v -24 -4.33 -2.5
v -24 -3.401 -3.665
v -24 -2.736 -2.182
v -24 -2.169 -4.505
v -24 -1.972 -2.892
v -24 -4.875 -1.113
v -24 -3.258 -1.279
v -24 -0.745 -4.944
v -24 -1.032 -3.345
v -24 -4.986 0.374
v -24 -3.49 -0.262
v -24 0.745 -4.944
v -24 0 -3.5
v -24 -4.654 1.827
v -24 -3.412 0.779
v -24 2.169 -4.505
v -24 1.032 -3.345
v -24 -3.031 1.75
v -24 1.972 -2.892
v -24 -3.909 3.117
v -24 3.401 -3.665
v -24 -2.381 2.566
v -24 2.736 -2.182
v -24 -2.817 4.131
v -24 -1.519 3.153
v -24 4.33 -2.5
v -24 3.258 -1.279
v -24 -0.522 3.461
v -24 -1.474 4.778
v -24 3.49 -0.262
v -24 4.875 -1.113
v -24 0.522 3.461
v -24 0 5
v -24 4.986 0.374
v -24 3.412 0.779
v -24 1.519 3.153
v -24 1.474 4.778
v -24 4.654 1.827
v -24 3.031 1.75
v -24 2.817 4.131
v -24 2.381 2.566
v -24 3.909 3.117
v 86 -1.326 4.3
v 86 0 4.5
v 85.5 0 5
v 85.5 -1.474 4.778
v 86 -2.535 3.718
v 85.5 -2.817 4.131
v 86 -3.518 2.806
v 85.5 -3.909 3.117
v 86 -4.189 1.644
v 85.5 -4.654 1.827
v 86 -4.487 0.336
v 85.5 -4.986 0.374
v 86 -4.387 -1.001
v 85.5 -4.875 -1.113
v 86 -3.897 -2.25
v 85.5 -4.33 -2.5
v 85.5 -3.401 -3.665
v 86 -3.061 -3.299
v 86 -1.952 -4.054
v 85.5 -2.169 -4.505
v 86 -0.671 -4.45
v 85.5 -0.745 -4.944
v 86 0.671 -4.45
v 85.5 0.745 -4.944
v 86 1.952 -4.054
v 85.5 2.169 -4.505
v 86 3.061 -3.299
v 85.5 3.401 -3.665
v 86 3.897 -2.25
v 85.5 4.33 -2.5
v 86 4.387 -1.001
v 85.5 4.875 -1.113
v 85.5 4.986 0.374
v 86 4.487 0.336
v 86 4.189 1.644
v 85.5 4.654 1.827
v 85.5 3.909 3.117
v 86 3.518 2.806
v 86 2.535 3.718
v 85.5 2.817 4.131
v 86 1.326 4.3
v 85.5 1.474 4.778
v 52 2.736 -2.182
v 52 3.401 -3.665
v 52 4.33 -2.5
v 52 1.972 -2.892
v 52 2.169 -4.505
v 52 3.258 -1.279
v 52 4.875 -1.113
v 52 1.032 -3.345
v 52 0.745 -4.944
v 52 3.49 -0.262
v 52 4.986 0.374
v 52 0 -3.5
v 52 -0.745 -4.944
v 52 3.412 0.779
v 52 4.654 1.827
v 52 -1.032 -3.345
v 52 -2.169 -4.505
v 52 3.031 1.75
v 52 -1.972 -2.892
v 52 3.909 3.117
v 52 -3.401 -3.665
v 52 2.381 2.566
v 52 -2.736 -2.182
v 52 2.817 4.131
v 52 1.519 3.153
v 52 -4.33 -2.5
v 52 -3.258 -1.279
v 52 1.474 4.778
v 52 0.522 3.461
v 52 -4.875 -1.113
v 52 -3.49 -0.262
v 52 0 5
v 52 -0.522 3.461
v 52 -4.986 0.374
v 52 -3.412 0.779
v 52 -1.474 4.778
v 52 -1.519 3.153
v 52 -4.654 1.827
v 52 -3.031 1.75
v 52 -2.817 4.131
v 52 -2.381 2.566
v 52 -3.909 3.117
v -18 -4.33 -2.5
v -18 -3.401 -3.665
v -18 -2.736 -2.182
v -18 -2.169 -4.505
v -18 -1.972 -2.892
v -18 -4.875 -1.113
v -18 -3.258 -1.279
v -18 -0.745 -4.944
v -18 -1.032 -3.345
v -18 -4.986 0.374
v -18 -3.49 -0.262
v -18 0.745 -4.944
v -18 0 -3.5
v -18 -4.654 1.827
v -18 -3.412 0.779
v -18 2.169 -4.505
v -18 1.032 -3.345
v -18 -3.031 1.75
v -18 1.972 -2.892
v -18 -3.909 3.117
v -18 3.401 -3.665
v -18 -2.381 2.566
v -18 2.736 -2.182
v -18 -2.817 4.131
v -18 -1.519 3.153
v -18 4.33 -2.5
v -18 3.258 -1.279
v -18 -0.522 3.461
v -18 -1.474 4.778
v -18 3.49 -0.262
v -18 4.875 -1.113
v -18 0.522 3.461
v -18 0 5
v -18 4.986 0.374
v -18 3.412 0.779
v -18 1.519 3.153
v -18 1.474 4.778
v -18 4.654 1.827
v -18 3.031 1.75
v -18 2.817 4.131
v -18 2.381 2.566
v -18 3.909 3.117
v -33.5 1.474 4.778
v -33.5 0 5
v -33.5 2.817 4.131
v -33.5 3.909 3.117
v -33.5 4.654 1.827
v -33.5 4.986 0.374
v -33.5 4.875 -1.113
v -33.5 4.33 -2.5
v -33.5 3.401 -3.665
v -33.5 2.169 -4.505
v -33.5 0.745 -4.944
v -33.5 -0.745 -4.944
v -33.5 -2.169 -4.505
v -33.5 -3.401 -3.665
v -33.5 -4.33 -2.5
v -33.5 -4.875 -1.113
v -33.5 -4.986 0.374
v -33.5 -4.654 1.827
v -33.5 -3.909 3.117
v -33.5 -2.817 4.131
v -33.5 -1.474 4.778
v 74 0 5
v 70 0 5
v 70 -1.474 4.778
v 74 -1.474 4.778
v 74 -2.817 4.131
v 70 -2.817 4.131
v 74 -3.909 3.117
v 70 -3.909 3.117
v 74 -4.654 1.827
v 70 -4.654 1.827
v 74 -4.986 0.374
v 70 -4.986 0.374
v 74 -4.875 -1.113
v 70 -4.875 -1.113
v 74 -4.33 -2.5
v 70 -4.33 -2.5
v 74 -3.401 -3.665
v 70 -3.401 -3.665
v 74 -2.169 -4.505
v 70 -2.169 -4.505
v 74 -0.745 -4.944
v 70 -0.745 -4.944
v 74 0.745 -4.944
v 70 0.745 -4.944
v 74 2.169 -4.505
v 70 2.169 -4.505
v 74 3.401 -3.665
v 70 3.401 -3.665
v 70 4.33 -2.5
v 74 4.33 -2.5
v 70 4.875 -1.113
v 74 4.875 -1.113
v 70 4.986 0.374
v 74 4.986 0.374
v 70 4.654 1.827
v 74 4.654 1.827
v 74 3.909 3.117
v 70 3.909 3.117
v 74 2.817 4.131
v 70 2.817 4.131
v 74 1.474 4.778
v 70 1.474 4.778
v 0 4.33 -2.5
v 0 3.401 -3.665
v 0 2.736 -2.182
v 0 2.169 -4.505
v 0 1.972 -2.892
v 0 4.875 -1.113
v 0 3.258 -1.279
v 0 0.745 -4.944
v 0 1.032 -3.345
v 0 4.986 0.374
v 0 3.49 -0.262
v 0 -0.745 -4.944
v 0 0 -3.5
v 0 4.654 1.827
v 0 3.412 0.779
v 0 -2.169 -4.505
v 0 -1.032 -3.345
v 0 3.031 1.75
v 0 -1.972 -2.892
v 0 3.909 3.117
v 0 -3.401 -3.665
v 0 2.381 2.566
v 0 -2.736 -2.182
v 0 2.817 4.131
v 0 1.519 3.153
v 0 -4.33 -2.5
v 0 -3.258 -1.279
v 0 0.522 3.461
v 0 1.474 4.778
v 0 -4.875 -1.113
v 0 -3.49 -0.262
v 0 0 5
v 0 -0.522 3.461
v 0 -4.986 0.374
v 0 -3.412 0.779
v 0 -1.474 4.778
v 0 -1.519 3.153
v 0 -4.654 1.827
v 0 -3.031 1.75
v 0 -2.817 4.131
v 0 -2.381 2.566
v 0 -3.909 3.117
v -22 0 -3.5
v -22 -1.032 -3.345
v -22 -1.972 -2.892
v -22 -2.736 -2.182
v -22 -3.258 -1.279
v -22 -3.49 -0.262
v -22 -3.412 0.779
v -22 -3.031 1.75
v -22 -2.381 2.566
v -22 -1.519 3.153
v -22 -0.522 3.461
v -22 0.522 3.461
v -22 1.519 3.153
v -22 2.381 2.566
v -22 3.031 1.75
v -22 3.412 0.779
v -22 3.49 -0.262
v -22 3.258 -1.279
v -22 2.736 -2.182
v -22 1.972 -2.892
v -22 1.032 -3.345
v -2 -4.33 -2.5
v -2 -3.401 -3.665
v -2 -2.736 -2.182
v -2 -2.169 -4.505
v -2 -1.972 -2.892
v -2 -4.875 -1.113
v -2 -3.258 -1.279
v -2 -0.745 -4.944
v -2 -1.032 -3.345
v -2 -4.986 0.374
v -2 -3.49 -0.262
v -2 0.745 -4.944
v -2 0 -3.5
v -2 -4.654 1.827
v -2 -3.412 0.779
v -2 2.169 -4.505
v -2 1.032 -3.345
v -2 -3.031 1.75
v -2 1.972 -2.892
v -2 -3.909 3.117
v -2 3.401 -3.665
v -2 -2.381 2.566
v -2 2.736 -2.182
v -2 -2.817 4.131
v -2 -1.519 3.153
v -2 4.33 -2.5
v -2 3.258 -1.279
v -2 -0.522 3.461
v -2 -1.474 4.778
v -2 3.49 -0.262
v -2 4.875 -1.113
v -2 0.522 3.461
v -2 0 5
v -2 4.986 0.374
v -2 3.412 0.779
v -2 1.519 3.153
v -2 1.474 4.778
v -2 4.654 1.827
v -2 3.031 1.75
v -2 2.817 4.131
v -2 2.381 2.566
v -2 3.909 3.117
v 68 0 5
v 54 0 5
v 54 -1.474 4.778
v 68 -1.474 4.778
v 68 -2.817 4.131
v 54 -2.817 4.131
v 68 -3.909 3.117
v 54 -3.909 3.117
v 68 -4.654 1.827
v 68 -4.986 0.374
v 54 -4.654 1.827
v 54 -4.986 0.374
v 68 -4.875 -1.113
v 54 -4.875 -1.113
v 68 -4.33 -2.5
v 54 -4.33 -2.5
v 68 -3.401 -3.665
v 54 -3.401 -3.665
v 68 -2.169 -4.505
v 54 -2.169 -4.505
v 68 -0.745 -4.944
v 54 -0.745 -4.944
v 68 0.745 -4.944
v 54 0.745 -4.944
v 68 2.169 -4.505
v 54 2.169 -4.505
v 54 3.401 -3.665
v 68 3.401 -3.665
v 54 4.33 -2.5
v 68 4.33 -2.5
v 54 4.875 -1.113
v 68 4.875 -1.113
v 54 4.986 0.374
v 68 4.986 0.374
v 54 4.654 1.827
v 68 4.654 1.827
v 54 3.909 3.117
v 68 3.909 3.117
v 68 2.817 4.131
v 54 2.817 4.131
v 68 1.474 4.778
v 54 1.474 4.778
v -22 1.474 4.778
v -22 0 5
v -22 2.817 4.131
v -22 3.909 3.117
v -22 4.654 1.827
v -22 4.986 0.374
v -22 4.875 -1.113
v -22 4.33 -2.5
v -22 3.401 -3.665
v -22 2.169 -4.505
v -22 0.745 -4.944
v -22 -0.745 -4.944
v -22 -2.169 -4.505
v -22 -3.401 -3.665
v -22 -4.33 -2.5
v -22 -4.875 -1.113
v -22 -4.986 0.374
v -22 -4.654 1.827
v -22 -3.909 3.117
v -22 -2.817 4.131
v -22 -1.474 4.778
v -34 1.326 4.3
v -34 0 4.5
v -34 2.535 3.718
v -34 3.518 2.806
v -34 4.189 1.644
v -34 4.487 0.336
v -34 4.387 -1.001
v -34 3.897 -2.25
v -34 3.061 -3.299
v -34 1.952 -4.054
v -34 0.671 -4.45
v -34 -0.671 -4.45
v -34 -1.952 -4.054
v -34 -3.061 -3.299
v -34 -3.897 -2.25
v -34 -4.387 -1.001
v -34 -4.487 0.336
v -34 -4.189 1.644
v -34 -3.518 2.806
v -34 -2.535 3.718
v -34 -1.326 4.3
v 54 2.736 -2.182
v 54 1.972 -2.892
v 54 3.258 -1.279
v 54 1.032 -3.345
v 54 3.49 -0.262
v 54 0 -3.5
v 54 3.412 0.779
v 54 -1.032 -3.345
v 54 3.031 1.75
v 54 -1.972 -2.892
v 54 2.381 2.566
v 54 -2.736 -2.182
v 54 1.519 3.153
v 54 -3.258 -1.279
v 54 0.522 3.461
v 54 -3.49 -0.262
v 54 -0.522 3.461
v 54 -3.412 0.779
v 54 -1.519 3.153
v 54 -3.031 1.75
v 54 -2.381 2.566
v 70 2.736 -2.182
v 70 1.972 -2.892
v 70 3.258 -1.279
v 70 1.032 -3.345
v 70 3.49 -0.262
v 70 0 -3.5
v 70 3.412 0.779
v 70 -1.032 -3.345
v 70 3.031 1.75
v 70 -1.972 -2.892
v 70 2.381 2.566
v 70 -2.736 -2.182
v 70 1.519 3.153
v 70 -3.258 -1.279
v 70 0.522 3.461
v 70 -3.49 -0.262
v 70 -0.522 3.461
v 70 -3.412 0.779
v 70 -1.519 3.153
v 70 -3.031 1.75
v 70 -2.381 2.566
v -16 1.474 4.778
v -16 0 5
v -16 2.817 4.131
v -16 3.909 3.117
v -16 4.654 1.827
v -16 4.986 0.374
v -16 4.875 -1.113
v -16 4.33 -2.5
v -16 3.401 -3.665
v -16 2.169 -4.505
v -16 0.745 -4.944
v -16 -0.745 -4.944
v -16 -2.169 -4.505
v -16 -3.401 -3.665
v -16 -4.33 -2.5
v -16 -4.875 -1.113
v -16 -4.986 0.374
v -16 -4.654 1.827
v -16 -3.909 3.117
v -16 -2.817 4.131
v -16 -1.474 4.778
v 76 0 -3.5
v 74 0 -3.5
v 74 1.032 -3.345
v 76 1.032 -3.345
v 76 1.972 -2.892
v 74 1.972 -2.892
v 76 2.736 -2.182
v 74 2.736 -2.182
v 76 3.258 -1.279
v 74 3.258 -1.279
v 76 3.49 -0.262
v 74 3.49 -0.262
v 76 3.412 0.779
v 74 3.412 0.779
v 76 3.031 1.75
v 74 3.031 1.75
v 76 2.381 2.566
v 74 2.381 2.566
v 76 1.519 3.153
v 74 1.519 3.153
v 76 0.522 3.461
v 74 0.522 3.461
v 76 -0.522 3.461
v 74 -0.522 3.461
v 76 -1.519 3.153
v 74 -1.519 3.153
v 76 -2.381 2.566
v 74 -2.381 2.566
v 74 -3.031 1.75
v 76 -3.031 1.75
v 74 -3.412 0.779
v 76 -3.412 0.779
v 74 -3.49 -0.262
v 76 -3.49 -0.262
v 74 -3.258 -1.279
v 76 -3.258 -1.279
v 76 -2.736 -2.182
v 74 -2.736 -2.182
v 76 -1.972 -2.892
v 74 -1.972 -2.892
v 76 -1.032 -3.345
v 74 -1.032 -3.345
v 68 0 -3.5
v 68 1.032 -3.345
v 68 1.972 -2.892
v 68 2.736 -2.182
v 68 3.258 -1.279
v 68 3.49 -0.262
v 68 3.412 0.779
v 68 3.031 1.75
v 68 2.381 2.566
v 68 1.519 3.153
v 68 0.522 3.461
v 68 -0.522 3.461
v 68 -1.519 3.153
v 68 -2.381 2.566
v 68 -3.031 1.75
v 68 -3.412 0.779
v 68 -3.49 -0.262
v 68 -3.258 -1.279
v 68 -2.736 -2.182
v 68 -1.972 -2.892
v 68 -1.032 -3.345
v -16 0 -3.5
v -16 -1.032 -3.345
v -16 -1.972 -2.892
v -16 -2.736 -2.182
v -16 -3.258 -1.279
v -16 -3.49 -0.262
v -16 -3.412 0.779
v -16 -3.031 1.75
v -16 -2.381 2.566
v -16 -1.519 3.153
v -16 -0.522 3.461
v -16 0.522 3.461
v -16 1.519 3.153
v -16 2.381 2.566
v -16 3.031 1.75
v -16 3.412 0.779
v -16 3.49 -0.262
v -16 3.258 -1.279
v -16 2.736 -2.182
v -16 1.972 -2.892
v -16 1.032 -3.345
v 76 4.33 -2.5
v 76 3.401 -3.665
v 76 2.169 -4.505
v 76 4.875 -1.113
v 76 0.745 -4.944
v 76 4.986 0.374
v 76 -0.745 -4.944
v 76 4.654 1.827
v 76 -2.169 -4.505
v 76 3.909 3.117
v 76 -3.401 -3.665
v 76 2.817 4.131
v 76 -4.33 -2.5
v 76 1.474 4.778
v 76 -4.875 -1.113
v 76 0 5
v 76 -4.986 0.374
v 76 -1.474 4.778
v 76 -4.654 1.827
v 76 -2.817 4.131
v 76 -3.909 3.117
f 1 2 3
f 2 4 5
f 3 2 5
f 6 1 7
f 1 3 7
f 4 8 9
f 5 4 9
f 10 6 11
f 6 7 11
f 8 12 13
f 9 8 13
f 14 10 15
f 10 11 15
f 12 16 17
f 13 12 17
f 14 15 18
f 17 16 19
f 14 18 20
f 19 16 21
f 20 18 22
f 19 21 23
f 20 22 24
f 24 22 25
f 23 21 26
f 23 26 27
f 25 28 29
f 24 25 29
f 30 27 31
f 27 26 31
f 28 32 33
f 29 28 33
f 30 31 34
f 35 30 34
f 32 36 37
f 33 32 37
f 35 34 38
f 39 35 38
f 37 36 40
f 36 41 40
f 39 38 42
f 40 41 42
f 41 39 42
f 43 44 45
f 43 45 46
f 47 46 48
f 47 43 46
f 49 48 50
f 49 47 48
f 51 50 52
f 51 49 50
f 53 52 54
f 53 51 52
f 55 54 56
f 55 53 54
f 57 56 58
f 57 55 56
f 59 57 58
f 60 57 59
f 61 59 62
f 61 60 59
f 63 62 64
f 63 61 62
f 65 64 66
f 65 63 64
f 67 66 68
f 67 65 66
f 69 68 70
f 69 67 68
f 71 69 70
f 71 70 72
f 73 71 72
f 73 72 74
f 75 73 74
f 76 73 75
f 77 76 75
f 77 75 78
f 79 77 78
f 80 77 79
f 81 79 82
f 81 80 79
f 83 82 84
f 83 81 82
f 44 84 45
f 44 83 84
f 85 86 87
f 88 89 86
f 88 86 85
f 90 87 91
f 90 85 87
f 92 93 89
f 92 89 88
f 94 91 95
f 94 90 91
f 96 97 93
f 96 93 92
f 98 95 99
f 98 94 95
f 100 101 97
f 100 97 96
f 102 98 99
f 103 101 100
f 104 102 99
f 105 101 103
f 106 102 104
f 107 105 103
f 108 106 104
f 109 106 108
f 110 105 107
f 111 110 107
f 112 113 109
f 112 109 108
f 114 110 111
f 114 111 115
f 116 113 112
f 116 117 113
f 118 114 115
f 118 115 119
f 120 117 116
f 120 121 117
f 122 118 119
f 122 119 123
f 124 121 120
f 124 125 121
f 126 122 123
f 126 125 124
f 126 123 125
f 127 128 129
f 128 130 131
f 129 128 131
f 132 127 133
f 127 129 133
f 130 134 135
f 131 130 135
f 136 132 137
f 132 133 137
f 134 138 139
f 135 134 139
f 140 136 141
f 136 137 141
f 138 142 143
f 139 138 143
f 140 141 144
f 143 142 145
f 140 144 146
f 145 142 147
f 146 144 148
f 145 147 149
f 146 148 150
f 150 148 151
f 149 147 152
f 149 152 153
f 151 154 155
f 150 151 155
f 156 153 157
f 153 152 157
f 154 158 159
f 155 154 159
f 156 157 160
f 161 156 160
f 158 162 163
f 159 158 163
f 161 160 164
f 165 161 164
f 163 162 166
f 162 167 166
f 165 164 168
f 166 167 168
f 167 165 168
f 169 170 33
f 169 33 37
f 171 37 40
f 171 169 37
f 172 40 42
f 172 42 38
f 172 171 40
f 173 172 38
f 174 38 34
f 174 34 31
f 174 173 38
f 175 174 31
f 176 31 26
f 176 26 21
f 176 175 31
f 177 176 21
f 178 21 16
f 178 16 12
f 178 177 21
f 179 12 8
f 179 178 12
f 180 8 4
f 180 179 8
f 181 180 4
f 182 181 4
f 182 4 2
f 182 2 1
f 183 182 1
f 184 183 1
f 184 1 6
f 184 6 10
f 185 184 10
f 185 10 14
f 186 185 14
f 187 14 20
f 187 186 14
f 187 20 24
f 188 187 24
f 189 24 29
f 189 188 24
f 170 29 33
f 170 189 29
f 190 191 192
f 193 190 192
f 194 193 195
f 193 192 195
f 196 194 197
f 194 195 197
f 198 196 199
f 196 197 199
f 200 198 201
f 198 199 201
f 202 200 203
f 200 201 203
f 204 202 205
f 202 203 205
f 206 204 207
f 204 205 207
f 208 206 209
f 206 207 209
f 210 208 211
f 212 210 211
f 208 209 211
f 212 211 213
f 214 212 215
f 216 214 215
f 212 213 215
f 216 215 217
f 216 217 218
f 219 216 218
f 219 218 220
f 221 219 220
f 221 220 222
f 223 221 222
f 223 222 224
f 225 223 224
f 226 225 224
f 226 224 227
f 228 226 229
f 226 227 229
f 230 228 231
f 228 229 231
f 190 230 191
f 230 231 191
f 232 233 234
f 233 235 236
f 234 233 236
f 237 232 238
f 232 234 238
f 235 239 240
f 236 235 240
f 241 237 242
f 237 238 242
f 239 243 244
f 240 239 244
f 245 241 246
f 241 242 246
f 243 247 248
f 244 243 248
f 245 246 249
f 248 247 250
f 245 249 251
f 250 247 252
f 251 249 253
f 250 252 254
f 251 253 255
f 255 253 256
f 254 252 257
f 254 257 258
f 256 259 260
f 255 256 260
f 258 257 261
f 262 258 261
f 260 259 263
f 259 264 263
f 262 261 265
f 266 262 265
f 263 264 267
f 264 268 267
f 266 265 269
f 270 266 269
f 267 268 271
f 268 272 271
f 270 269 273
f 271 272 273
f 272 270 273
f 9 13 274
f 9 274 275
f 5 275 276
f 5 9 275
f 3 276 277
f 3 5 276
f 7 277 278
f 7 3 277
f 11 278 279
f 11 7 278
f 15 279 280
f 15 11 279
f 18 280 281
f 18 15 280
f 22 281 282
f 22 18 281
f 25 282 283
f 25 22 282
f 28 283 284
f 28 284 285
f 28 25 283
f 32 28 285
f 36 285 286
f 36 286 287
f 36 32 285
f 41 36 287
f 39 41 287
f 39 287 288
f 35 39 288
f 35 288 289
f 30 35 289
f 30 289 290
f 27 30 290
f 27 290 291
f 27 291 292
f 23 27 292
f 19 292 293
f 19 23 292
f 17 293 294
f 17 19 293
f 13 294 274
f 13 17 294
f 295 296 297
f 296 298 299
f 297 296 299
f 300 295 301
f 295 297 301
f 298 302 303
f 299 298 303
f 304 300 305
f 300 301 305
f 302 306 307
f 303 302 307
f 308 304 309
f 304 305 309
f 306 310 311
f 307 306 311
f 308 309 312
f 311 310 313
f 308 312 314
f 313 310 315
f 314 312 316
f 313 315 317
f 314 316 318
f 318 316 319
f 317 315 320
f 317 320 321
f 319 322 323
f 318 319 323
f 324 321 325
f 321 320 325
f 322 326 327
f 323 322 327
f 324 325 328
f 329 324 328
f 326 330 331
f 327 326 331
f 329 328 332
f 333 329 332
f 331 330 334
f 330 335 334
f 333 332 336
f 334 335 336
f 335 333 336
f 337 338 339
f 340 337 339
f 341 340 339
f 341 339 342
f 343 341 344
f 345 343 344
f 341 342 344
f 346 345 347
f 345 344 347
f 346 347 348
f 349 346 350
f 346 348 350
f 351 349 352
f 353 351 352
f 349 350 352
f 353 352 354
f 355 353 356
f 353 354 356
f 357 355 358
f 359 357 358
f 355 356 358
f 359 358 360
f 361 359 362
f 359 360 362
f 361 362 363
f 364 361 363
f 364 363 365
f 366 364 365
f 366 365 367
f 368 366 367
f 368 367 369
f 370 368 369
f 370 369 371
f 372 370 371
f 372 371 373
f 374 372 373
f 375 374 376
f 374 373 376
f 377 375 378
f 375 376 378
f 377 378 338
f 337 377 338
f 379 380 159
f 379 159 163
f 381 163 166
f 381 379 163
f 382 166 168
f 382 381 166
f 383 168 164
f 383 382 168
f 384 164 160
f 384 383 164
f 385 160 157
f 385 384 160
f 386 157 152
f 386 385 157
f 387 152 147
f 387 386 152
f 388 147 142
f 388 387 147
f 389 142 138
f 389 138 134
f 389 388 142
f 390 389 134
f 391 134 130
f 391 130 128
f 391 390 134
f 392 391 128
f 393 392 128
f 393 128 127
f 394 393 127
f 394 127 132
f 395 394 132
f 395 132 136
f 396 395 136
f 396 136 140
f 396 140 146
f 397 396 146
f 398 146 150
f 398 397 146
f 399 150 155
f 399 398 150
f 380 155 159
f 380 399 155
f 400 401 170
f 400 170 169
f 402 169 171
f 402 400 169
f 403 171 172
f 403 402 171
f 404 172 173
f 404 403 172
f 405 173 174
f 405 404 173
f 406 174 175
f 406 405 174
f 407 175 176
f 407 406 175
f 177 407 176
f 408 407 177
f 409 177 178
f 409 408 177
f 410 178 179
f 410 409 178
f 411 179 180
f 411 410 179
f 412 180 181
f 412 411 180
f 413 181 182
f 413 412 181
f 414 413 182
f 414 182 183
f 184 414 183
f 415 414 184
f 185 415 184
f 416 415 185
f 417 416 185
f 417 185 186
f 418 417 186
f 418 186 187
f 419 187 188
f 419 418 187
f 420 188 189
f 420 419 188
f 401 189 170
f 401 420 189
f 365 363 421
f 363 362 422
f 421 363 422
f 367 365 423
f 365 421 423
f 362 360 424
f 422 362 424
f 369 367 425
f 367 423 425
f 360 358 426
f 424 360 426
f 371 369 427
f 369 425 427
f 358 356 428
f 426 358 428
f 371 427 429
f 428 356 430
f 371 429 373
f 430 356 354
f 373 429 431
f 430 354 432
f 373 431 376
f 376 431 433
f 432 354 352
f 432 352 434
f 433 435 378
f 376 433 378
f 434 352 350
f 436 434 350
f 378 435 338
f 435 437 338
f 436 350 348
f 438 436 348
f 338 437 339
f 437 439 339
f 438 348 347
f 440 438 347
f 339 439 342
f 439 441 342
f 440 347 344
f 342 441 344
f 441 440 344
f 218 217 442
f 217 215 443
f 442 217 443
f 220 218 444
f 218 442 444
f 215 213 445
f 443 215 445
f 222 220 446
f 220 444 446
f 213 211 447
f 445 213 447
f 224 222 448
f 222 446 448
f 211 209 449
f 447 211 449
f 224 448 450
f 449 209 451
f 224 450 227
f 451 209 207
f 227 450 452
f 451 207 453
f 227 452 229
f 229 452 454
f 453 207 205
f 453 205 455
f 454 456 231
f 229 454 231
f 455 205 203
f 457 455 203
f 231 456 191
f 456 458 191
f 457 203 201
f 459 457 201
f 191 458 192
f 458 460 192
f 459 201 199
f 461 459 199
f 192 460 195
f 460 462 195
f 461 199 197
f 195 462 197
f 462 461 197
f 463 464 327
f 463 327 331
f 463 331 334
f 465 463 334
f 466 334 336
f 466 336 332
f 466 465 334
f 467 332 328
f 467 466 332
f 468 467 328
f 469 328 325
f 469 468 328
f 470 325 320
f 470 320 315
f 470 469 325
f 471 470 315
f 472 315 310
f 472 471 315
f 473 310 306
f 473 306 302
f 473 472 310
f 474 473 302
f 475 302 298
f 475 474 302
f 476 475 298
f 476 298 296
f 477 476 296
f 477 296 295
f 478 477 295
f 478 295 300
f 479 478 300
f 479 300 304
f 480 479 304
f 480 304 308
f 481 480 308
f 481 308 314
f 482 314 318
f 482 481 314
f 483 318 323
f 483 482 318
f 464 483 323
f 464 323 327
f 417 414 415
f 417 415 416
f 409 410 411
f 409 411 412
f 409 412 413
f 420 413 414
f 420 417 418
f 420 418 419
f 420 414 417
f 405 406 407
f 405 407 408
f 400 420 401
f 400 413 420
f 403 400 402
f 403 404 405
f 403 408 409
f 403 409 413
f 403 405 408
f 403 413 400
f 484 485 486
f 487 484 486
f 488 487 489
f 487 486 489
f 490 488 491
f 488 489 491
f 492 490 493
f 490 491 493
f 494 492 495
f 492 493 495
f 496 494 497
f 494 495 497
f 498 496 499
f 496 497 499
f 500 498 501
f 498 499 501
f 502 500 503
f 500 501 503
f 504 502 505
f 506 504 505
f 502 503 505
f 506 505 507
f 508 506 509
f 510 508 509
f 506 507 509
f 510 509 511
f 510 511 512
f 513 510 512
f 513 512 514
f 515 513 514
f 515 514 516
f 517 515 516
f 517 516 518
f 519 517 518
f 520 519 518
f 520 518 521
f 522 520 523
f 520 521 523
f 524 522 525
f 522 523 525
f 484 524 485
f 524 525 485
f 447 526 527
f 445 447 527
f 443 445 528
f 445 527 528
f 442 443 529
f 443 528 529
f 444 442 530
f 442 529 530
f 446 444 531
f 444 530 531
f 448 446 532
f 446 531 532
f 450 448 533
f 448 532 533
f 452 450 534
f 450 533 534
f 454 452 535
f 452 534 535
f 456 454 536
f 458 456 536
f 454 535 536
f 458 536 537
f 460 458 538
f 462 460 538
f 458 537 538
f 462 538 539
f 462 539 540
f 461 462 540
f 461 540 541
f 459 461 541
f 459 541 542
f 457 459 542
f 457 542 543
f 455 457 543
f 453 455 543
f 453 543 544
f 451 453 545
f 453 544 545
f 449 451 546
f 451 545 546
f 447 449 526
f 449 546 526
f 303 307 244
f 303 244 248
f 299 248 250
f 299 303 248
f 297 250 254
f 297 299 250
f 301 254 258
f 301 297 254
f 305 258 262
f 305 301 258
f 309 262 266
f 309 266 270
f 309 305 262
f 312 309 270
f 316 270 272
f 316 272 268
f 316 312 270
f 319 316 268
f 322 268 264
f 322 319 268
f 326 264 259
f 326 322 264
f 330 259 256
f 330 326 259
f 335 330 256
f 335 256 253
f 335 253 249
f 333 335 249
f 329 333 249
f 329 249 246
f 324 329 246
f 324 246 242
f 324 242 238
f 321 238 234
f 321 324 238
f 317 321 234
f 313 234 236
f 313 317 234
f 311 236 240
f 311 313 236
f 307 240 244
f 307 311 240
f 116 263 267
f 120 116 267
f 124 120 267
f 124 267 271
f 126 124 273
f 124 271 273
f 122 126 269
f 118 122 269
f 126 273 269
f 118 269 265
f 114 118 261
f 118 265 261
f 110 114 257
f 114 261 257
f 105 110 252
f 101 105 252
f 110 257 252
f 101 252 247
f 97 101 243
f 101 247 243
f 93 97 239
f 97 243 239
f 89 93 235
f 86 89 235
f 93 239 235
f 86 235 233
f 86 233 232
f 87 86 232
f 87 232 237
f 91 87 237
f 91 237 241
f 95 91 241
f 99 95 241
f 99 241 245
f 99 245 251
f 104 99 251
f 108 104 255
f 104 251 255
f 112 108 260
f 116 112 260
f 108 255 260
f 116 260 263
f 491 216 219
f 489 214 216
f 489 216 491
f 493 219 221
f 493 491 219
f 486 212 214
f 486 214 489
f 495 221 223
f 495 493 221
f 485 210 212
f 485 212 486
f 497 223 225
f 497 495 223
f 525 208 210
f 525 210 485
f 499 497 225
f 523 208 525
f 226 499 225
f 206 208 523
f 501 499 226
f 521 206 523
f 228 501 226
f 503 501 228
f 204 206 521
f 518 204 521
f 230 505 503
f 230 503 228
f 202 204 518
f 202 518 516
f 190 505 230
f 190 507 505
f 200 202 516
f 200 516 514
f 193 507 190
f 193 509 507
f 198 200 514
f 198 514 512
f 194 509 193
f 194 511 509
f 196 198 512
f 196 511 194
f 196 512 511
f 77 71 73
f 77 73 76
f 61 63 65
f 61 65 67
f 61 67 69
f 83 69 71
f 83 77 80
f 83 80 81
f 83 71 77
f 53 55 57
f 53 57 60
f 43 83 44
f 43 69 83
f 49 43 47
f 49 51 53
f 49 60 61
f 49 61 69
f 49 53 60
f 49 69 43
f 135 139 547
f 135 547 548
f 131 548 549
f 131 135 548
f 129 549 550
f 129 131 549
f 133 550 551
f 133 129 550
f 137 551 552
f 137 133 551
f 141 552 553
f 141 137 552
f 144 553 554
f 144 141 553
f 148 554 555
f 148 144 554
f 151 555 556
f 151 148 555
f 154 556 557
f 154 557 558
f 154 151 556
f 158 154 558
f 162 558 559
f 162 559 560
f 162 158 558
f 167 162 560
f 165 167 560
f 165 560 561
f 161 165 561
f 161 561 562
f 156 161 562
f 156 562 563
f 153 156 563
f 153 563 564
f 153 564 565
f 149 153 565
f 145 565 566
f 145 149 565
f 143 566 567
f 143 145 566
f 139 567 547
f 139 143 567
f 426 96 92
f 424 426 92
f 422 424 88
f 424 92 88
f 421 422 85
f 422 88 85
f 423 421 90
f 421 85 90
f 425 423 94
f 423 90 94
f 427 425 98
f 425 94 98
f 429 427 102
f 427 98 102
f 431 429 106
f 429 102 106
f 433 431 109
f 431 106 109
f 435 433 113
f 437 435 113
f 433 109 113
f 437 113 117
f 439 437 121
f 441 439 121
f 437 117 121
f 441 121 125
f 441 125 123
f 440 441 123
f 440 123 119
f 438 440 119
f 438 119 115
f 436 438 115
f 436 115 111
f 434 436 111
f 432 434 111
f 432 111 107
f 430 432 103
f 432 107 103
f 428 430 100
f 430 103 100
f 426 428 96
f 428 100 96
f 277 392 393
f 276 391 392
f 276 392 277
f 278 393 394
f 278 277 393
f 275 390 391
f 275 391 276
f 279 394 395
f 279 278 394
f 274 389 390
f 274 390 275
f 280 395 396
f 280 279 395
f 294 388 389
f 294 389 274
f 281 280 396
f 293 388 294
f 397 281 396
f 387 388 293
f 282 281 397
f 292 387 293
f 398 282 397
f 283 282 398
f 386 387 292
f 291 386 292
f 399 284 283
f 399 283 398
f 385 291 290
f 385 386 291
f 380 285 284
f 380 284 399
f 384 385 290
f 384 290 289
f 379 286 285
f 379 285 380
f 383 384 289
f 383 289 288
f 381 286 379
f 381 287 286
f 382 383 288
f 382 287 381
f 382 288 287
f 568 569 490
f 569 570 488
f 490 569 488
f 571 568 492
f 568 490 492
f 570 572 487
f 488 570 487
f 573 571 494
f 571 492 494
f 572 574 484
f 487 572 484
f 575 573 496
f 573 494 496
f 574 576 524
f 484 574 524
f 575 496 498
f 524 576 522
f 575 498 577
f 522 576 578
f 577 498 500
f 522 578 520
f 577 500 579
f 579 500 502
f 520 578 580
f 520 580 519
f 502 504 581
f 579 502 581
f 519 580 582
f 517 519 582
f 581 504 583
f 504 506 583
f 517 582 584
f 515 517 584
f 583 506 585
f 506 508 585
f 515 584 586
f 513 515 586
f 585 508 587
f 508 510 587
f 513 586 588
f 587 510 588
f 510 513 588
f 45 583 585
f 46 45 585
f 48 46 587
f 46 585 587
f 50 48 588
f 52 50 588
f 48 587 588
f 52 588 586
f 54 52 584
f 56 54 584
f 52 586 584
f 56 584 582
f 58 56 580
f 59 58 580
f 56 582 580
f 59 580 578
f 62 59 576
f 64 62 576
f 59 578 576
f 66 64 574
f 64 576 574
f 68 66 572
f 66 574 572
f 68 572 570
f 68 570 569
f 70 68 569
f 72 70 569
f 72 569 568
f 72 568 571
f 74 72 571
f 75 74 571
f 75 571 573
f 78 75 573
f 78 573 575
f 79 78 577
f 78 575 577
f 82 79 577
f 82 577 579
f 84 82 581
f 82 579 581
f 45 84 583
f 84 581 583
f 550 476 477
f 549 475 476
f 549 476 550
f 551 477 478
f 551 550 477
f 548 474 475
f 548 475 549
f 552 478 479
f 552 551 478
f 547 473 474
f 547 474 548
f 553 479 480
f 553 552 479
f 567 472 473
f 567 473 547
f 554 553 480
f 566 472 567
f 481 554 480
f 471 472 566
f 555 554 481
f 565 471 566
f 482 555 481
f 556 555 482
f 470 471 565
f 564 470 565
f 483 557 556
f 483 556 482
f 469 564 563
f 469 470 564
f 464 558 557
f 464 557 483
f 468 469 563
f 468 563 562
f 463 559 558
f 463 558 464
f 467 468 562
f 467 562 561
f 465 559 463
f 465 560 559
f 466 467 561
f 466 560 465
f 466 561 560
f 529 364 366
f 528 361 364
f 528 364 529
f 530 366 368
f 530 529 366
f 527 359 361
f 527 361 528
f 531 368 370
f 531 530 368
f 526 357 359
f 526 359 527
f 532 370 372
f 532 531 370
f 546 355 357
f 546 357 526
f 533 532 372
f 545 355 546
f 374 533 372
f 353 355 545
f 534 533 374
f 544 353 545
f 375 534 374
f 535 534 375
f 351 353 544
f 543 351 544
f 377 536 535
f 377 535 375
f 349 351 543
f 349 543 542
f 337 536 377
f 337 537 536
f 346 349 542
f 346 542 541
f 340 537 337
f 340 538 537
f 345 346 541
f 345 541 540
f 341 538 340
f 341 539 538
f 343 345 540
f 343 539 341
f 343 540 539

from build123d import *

# Parameters (mm, degrees)
SKETCH_1_R       = 5
EXTRUDE_1_DEPTH  = 52
SKETCH_2_R       = 3.5
EXTRUDE_2_DEPTH  = 2
SKETCH_3_R       = 5
EXTRUDE_3_DEPTH  = 14
SKETCH_4_R       = 3.5
EXTRUDE_4_DEPTH  = 2
SKETCH_5_R       = 5
EXTRUDE_5_DEPTH  = 4
SKETCH_6_R       = 3.5
EXTRUDE_6_DEPTH  = 2
SKETCH_7_R       = 5
EXTRUDE_7_DEPTH  = 10
EXTRUDE_START    = 2
SKETCH_8_R       = 3.5
EXTRUDE_8_DEPTH  = 2
EXTRUDE_START_2  = 14
SKETCH_9_R       = 5
EXTRUDE_9_DEPTH  = 14
SKETCH_10_R      = 3.5
EXTRUDE_10_DEPTH = 2
EXTRUDE_START_3  = 4
SKETCH_11_R      = 5
EXTRUDE_11_DEPTH = 4
SKETCH_12_R      = 3.5
EXTRUDE_12_DEPTH = 2
EXTRUDE_START_4  = 10
SKETCH_13_R      = 5
EXTRUDE_13_DEPTH = 10
CHAMFER_1_SIZE   = 0.5


with BuildPart() as part:
    # 草图1 → 凸台-拉伸1 (new body)
    with BuildSketch(Plane(origin=(0, 0, 0), x_dir=(0, 0, -1), z_dir=(1, 0, 0))):
        with Locations(Location((0, 0, 0), (0, 0, 180))):
            Circle(SKETCH_1_R)
    extrude(amount=EXTRUDE_1_DEPTH)

    # 草图2 → 凸台-拉伸2 (add)
    with BuildSketch(Plane(origin=(52, 0, 0), x_dir=(0, 0, -1), z_dir=(1, 0, 0))):
        Circle(SKETCH_2_R)
    extrude(amount=EXTRUDE_2_DEPTH)

    # 草图3 → 凸台-拉伸3 (add)
    with BuildSketch(Plane(origin=(54, 0, 0), x_dir=(0, 0, -1), z_dir=(1, 0, 0))):
        with Locations(Location((0, 0, 0), (0, 0, 180))):
            Circle(SKETCH_3_R)
    extrude(amount=EXTRUDE_3_DEPTH)

    # 草图4 → 凸台-拉伸4 (add)
    with BuildSketch(Plane(origin=(68, 0, 0), x_dir=(0, 0, -1), z_dir=(1, 0, 0))):
        Circle(SKETCH_4_R)
    extrude(amount=EXTRUDE_4_DEPTH)

    # 草图5 → 凸台-拉伸5 (add)
    with BuildSketch(Plane(origin=(70, 0, 0), x_dir=(0, 0, -1), z_dir=(1, 0, 0))):
        with Locations(Location((0, 0, 0), (0, 0, 180))):
            Circle(SKETCH_5_R)
    extrude(amount=EXTRUDE_5_DEPTH)

    # 草图6 → 凸台-拉伸6 (add)
    with BuildSketch(Plane(origin=(74, 0, 0), x_dir=(0, 0, -1), z_dir=(1, 0, 0))):
        Circle(SKETCH_6_R)
    extrude(amount=EXTRUDE_6_DEPTH)

    # 草图7 → 凸台-拉伸7 (add)
    with BuildSketch(Plane(origin=(76, 0, 0), x_dir=(0, 0, -1), z_dir=(1, 0, 0))):
        with Locations(Location((0, 0, 0), (0, 0, 180))):
            Circle(SKETCH_7_R)
    extrude(amount=EXTRUDE_7_DEPTH)

    # 草图8 → 凸台-拉伸8 (add)
    with BuildSketch(Plane.ZY.offset(EXTRUDE_START)):
        with Locations(Location((0, 0, 0), (0, 0, 180))):
            Circle(SKETCH_8_R)
    extrude(amount=-EXTRUDE_8_DEPTH)

    # 草图9 → 凸台-拉伸9 (add)
    with BuildSketch(Plane.ZY.offset(2).offset(EXTRUDE_START_2)):
        Circle(SKETCH_9_R)
    extrude(amount=-EXTRUDE_9_DEPTH)

    # 草图10 → 凸台-拉伸10 (add)
    with BuildSketch(Plane.ZY.offset(16).offset(EXTRUDE_START)):
        with Locations(Location((0, 0, 0), (0, 0, 180))):
            Circle(SKETCH_10_R)
    extrude(amount=-EXTRUDE_10_DEPTH)

    # 草图11 → 凸台-拉伸11 (add)
    with BuildSketch(Plane.ZY.offset(18).offset(EXTRUDE_START_3)):
        Circle(SKETCH_11_R)
    extrude(amount=-EXTRUDE_11_DEPTH)

    # 草图12 → 凸台-拉伸12 (add)
    with BuildSketch(Plane.ZY.offset(22).offset(EXTRUDE_START)):
        with Locations(Location((0, 0, 0), (0, 0, 180))):
            Circle(SKETCH_12_R)
    extrude(amount=-EXTRUDE_12_DEPTH)

    # 草图13 → 凸台-拉伸13 (add)
    with BuildSketch(Plane.ZY.offset(24).offset(EXTRUDE_START_4)):
        Circle(SKETCH_13_R)
    extrude(amount=-EXTRUDE_13_DEPTH)

    # 倒角1
    chamfer_1_edges = [part.edges().sort_by_distance(p)[0] for p in [
        (86, 0, -5),
        (-34, 0, -5),
    ]]
    chamfer(chamfer_1_edges, length=CHAMFER_1_SIZE)


solid = part.part
